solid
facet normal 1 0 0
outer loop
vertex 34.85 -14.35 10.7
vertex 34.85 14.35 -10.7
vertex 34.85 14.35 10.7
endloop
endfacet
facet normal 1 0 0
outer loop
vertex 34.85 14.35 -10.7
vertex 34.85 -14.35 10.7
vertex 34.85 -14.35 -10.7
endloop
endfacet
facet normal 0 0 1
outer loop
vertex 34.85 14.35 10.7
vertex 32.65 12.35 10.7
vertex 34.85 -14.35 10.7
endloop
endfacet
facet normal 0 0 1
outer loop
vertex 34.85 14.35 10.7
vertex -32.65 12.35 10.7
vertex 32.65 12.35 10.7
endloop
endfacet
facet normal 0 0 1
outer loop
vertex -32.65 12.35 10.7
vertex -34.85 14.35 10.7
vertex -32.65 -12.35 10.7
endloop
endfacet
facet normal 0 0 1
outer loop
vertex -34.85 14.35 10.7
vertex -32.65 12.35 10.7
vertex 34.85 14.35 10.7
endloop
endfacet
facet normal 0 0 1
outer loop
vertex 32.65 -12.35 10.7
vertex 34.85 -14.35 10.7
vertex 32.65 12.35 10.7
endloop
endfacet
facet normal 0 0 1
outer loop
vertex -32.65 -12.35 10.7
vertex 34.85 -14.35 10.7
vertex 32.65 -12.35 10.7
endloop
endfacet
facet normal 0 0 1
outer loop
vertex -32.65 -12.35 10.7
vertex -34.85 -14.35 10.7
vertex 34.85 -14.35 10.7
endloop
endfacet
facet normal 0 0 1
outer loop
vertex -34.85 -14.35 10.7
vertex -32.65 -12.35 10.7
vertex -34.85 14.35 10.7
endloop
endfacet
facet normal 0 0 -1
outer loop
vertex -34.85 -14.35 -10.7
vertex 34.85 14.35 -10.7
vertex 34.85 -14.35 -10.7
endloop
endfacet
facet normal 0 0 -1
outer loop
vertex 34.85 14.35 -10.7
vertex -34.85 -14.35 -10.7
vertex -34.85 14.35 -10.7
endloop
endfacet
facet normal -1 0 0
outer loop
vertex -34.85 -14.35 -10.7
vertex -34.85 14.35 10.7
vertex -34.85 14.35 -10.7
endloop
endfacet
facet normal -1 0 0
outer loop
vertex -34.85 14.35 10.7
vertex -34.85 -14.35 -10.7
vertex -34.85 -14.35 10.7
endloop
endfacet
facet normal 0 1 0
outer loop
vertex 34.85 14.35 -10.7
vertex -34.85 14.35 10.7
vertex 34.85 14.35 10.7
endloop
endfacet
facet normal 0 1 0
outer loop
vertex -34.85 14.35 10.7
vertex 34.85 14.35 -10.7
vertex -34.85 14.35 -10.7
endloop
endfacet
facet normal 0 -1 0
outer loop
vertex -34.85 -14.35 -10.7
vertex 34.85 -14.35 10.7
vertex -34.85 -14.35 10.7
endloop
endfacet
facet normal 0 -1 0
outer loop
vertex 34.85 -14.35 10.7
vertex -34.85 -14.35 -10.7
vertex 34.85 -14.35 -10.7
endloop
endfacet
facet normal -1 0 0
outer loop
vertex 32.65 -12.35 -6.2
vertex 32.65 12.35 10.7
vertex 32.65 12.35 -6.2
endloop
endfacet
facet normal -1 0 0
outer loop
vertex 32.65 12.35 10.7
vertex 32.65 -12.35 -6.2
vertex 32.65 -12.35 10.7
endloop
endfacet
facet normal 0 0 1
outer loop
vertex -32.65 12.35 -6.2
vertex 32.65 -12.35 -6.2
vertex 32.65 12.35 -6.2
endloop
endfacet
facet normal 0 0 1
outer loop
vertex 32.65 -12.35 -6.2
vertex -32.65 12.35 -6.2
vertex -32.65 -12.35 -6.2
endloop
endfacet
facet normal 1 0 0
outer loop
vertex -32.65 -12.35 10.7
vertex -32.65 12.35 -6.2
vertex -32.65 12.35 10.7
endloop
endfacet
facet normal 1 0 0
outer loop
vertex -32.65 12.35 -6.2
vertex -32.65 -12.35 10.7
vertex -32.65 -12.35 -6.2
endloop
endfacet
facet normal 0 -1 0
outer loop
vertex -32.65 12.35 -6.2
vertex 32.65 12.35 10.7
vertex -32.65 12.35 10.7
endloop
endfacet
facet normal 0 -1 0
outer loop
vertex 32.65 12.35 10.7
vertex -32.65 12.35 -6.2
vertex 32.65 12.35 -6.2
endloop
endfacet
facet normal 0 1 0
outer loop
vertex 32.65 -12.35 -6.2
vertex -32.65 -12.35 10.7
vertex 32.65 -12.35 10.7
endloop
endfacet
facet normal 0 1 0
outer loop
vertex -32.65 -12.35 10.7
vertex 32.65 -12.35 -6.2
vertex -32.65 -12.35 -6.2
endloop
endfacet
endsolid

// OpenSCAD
difference() {
    cube([69.7,28.7,21.4],true);
    translate([0,0,21.4-18.4]) cube([69.7-4.4,28.7-4,18.4],true);
}
